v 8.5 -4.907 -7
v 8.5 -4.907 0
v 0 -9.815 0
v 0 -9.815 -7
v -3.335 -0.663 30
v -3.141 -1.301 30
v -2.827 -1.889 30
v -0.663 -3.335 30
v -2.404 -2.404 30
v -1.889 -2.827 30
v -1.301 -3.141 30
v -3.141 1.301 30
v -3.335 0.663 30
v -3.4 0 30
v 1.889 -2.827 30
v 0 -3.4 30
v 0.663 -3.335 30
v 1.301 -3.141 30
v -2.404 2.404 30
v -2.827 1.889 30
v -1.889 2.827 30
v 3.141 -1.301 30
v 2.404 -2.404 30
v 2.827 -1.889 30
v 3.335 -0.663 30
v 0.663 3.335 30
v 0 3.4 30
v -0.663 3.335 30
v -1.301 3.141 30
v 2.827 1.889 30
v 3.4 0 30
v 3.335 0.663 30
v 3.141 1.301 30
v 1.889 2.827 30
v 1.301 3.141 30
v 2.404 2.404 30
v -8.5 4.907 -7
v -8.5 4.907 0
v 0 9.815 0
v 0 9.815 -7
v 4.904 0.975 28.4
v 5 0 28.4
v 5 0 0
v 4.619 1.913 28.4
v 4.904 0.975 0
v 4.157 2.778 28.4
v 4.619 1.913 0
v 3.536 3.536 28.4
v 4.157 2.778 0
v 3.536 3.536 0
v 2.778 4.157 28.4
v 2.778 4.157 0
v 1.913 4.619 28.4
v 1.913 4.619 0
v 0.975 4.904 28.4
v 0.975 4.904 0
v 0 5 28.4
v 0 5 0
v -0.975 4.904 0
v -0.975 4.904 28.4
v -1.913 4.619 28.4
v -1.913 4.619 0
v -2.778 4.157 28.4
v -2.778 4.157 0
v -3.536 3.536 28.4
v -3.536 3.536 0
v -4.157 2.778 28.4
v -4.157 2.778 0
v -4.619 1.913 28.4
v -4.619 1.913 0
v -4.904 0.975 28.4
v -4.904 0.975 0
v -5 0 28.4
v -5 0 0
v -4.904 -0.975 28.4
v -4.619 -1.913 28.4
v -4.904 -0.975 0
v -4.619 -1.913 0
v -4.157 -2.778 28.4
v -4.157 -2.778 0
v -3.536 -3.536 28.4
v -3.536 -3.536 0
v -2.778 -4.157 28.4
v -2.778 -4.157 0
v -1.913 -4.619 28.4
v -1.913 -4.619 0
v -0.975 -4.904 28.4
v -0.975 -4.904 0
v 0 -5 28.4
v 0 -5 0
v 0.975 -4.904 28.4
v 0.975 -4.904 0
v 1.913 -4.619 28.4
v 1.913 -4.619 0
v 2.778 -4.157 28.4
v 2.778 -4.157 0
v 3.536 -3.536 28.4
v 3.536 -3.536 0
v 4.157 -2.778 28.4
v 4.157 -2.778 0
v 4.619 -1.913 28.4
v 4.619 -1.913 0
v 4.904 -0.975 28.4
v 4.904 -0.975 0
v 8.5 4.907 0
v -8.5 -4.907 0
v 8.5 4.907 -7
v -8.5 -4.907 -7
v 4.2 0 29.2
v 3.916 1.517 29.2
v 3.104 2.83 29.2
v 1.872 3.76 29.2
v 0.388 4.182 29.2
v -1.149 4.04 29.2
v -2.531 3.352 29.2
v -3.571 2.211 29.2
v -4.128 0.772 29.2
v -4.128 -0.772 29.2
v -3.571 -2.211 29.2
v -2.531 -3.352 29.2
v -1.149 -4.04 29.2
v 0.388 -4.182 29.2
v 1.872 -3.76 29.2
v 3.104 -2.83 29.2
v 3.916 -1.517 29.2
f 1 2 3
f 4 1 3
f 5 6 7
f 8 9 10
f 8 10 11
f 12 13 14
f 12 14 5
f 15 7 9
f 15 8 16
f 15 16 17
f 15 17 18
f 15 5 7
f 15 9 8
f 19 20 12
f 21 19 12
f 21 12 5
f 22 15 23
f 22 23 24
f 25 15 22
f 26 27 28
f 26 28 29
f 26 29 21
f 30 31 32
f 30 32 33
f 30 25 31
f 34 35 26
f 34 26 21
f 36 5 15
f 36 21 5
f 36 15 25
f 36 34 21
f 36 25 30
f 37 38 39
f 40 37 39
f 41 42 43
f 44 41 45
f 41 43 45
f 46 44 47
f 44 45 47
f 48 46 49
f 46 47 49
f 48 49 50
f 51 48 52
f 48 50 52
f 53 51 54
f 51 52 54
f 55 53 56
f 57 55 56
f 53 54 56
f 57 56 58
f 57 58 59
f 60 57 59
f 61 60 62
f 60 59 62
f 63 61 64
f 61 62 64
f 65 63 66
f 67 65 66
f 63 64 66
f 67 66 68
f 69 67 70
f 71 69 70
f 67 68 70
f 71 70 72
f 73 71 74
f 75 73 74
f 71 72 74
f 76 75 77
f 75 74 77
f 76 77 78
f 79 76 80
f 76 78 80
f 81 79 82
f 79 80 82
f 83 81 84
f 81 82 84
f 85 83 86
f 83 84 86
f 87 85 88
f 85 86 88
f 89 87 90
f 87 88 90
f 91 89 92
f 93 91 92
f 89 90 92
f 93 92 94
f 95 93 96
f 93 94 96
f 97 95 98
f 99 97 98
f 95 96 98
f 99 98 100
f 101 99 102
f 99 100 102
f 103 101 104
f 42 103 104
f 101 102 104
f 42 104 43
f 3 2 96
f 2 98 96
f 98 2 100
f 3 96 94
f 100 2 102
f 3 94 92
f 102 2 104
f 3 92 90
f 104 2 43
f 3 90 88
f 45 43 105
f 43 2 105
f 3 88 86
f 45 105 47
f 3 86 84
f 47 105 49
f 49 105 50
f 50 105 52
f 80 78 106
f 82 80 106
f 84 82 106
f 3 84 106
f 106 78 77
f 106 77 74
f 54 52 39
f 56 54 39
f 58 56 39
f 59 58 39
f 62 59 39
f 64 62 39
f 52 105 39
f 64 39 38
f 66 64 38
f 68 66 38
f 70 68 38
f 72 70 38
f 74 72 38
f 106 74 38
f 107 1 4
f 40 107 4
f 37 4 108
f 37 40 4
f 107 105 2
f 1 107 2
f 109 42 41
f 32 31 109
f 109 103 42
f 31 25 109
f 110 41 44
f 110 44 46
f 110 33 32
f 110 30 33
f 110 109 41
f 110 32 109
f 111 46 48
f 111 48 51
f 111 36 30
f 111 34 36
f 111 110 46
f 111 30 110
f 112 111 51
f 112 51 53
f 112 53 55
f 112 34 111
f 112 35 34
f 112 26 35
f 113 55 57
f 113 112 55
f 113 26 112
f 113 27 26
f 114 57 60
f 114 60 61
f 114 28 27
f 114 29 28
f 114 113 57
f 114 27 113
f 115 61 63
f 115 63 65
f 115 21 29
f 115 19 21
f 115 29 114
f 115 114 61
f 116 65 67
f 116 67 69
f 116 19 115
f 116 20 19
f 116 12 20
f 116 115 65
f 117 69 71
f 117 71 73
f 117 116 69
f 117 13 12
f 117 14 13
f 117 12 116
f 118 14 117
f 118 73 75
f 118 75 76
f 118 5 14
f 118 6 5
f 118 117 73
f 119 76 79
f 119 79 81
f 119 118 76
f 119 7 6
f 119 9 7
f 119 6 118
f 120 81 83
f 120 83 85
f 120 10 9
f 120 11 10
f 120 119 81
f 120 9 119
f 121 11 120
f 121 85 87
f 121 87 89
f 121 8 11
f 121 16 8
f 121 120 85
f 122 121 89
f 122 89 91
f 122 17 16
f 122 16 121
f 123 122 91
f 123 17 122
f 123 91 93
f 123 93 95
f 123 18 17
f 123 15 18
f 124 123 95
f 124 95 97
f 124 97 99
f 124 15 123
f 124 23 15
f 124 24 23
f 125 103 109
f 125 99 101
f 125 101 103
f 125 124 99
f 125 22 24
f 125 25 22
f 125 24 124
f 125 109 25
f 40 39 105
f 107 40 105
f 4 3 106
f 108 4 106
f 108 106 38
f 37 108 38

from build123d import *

# Parameters (mm, degrees)
SKETCH1_R           = 5
BASE_EXTRUDE_DEPTH  = 30
BOSS_EXTRUDE2_DEPTH = 7
CHAMFER1_SIZE       = 1.6


with BuildPart() as part:
    # Sketch1 → Base-Extrude (new body)
    with BuildSketch(Plane.XY):
        Circle(SKETCH1_R)
    extrude(amount=BASE_EXTRUDE_DEPTH)

    # Sketch2 → Boss-Extrude2 (add)
    with BuildSketch(Plane(origin=(0, 0, 0), x_dir=(-1, 0, 0), z_dir=(0, 0, -1))):
        Polygon((0, 9.814954576), (-8.5, 4.907477288), (-8.5, -4.907477288), (0, -9.814954576), (8.5, -4.907477288), (8.5, 4.907477288), align=None)
    extrude(amount=BOSS_EXTRUDE2_DEPTH)

    # Chamfer1
    chamfer1_edges = [part.edges().sort_by_distance(p)[0] for p in [
        (-5, 0, 30),
    ]]
    chamfer(chamfer1_edges, length=CHAMFER1_SIZE)


solid = part.part
